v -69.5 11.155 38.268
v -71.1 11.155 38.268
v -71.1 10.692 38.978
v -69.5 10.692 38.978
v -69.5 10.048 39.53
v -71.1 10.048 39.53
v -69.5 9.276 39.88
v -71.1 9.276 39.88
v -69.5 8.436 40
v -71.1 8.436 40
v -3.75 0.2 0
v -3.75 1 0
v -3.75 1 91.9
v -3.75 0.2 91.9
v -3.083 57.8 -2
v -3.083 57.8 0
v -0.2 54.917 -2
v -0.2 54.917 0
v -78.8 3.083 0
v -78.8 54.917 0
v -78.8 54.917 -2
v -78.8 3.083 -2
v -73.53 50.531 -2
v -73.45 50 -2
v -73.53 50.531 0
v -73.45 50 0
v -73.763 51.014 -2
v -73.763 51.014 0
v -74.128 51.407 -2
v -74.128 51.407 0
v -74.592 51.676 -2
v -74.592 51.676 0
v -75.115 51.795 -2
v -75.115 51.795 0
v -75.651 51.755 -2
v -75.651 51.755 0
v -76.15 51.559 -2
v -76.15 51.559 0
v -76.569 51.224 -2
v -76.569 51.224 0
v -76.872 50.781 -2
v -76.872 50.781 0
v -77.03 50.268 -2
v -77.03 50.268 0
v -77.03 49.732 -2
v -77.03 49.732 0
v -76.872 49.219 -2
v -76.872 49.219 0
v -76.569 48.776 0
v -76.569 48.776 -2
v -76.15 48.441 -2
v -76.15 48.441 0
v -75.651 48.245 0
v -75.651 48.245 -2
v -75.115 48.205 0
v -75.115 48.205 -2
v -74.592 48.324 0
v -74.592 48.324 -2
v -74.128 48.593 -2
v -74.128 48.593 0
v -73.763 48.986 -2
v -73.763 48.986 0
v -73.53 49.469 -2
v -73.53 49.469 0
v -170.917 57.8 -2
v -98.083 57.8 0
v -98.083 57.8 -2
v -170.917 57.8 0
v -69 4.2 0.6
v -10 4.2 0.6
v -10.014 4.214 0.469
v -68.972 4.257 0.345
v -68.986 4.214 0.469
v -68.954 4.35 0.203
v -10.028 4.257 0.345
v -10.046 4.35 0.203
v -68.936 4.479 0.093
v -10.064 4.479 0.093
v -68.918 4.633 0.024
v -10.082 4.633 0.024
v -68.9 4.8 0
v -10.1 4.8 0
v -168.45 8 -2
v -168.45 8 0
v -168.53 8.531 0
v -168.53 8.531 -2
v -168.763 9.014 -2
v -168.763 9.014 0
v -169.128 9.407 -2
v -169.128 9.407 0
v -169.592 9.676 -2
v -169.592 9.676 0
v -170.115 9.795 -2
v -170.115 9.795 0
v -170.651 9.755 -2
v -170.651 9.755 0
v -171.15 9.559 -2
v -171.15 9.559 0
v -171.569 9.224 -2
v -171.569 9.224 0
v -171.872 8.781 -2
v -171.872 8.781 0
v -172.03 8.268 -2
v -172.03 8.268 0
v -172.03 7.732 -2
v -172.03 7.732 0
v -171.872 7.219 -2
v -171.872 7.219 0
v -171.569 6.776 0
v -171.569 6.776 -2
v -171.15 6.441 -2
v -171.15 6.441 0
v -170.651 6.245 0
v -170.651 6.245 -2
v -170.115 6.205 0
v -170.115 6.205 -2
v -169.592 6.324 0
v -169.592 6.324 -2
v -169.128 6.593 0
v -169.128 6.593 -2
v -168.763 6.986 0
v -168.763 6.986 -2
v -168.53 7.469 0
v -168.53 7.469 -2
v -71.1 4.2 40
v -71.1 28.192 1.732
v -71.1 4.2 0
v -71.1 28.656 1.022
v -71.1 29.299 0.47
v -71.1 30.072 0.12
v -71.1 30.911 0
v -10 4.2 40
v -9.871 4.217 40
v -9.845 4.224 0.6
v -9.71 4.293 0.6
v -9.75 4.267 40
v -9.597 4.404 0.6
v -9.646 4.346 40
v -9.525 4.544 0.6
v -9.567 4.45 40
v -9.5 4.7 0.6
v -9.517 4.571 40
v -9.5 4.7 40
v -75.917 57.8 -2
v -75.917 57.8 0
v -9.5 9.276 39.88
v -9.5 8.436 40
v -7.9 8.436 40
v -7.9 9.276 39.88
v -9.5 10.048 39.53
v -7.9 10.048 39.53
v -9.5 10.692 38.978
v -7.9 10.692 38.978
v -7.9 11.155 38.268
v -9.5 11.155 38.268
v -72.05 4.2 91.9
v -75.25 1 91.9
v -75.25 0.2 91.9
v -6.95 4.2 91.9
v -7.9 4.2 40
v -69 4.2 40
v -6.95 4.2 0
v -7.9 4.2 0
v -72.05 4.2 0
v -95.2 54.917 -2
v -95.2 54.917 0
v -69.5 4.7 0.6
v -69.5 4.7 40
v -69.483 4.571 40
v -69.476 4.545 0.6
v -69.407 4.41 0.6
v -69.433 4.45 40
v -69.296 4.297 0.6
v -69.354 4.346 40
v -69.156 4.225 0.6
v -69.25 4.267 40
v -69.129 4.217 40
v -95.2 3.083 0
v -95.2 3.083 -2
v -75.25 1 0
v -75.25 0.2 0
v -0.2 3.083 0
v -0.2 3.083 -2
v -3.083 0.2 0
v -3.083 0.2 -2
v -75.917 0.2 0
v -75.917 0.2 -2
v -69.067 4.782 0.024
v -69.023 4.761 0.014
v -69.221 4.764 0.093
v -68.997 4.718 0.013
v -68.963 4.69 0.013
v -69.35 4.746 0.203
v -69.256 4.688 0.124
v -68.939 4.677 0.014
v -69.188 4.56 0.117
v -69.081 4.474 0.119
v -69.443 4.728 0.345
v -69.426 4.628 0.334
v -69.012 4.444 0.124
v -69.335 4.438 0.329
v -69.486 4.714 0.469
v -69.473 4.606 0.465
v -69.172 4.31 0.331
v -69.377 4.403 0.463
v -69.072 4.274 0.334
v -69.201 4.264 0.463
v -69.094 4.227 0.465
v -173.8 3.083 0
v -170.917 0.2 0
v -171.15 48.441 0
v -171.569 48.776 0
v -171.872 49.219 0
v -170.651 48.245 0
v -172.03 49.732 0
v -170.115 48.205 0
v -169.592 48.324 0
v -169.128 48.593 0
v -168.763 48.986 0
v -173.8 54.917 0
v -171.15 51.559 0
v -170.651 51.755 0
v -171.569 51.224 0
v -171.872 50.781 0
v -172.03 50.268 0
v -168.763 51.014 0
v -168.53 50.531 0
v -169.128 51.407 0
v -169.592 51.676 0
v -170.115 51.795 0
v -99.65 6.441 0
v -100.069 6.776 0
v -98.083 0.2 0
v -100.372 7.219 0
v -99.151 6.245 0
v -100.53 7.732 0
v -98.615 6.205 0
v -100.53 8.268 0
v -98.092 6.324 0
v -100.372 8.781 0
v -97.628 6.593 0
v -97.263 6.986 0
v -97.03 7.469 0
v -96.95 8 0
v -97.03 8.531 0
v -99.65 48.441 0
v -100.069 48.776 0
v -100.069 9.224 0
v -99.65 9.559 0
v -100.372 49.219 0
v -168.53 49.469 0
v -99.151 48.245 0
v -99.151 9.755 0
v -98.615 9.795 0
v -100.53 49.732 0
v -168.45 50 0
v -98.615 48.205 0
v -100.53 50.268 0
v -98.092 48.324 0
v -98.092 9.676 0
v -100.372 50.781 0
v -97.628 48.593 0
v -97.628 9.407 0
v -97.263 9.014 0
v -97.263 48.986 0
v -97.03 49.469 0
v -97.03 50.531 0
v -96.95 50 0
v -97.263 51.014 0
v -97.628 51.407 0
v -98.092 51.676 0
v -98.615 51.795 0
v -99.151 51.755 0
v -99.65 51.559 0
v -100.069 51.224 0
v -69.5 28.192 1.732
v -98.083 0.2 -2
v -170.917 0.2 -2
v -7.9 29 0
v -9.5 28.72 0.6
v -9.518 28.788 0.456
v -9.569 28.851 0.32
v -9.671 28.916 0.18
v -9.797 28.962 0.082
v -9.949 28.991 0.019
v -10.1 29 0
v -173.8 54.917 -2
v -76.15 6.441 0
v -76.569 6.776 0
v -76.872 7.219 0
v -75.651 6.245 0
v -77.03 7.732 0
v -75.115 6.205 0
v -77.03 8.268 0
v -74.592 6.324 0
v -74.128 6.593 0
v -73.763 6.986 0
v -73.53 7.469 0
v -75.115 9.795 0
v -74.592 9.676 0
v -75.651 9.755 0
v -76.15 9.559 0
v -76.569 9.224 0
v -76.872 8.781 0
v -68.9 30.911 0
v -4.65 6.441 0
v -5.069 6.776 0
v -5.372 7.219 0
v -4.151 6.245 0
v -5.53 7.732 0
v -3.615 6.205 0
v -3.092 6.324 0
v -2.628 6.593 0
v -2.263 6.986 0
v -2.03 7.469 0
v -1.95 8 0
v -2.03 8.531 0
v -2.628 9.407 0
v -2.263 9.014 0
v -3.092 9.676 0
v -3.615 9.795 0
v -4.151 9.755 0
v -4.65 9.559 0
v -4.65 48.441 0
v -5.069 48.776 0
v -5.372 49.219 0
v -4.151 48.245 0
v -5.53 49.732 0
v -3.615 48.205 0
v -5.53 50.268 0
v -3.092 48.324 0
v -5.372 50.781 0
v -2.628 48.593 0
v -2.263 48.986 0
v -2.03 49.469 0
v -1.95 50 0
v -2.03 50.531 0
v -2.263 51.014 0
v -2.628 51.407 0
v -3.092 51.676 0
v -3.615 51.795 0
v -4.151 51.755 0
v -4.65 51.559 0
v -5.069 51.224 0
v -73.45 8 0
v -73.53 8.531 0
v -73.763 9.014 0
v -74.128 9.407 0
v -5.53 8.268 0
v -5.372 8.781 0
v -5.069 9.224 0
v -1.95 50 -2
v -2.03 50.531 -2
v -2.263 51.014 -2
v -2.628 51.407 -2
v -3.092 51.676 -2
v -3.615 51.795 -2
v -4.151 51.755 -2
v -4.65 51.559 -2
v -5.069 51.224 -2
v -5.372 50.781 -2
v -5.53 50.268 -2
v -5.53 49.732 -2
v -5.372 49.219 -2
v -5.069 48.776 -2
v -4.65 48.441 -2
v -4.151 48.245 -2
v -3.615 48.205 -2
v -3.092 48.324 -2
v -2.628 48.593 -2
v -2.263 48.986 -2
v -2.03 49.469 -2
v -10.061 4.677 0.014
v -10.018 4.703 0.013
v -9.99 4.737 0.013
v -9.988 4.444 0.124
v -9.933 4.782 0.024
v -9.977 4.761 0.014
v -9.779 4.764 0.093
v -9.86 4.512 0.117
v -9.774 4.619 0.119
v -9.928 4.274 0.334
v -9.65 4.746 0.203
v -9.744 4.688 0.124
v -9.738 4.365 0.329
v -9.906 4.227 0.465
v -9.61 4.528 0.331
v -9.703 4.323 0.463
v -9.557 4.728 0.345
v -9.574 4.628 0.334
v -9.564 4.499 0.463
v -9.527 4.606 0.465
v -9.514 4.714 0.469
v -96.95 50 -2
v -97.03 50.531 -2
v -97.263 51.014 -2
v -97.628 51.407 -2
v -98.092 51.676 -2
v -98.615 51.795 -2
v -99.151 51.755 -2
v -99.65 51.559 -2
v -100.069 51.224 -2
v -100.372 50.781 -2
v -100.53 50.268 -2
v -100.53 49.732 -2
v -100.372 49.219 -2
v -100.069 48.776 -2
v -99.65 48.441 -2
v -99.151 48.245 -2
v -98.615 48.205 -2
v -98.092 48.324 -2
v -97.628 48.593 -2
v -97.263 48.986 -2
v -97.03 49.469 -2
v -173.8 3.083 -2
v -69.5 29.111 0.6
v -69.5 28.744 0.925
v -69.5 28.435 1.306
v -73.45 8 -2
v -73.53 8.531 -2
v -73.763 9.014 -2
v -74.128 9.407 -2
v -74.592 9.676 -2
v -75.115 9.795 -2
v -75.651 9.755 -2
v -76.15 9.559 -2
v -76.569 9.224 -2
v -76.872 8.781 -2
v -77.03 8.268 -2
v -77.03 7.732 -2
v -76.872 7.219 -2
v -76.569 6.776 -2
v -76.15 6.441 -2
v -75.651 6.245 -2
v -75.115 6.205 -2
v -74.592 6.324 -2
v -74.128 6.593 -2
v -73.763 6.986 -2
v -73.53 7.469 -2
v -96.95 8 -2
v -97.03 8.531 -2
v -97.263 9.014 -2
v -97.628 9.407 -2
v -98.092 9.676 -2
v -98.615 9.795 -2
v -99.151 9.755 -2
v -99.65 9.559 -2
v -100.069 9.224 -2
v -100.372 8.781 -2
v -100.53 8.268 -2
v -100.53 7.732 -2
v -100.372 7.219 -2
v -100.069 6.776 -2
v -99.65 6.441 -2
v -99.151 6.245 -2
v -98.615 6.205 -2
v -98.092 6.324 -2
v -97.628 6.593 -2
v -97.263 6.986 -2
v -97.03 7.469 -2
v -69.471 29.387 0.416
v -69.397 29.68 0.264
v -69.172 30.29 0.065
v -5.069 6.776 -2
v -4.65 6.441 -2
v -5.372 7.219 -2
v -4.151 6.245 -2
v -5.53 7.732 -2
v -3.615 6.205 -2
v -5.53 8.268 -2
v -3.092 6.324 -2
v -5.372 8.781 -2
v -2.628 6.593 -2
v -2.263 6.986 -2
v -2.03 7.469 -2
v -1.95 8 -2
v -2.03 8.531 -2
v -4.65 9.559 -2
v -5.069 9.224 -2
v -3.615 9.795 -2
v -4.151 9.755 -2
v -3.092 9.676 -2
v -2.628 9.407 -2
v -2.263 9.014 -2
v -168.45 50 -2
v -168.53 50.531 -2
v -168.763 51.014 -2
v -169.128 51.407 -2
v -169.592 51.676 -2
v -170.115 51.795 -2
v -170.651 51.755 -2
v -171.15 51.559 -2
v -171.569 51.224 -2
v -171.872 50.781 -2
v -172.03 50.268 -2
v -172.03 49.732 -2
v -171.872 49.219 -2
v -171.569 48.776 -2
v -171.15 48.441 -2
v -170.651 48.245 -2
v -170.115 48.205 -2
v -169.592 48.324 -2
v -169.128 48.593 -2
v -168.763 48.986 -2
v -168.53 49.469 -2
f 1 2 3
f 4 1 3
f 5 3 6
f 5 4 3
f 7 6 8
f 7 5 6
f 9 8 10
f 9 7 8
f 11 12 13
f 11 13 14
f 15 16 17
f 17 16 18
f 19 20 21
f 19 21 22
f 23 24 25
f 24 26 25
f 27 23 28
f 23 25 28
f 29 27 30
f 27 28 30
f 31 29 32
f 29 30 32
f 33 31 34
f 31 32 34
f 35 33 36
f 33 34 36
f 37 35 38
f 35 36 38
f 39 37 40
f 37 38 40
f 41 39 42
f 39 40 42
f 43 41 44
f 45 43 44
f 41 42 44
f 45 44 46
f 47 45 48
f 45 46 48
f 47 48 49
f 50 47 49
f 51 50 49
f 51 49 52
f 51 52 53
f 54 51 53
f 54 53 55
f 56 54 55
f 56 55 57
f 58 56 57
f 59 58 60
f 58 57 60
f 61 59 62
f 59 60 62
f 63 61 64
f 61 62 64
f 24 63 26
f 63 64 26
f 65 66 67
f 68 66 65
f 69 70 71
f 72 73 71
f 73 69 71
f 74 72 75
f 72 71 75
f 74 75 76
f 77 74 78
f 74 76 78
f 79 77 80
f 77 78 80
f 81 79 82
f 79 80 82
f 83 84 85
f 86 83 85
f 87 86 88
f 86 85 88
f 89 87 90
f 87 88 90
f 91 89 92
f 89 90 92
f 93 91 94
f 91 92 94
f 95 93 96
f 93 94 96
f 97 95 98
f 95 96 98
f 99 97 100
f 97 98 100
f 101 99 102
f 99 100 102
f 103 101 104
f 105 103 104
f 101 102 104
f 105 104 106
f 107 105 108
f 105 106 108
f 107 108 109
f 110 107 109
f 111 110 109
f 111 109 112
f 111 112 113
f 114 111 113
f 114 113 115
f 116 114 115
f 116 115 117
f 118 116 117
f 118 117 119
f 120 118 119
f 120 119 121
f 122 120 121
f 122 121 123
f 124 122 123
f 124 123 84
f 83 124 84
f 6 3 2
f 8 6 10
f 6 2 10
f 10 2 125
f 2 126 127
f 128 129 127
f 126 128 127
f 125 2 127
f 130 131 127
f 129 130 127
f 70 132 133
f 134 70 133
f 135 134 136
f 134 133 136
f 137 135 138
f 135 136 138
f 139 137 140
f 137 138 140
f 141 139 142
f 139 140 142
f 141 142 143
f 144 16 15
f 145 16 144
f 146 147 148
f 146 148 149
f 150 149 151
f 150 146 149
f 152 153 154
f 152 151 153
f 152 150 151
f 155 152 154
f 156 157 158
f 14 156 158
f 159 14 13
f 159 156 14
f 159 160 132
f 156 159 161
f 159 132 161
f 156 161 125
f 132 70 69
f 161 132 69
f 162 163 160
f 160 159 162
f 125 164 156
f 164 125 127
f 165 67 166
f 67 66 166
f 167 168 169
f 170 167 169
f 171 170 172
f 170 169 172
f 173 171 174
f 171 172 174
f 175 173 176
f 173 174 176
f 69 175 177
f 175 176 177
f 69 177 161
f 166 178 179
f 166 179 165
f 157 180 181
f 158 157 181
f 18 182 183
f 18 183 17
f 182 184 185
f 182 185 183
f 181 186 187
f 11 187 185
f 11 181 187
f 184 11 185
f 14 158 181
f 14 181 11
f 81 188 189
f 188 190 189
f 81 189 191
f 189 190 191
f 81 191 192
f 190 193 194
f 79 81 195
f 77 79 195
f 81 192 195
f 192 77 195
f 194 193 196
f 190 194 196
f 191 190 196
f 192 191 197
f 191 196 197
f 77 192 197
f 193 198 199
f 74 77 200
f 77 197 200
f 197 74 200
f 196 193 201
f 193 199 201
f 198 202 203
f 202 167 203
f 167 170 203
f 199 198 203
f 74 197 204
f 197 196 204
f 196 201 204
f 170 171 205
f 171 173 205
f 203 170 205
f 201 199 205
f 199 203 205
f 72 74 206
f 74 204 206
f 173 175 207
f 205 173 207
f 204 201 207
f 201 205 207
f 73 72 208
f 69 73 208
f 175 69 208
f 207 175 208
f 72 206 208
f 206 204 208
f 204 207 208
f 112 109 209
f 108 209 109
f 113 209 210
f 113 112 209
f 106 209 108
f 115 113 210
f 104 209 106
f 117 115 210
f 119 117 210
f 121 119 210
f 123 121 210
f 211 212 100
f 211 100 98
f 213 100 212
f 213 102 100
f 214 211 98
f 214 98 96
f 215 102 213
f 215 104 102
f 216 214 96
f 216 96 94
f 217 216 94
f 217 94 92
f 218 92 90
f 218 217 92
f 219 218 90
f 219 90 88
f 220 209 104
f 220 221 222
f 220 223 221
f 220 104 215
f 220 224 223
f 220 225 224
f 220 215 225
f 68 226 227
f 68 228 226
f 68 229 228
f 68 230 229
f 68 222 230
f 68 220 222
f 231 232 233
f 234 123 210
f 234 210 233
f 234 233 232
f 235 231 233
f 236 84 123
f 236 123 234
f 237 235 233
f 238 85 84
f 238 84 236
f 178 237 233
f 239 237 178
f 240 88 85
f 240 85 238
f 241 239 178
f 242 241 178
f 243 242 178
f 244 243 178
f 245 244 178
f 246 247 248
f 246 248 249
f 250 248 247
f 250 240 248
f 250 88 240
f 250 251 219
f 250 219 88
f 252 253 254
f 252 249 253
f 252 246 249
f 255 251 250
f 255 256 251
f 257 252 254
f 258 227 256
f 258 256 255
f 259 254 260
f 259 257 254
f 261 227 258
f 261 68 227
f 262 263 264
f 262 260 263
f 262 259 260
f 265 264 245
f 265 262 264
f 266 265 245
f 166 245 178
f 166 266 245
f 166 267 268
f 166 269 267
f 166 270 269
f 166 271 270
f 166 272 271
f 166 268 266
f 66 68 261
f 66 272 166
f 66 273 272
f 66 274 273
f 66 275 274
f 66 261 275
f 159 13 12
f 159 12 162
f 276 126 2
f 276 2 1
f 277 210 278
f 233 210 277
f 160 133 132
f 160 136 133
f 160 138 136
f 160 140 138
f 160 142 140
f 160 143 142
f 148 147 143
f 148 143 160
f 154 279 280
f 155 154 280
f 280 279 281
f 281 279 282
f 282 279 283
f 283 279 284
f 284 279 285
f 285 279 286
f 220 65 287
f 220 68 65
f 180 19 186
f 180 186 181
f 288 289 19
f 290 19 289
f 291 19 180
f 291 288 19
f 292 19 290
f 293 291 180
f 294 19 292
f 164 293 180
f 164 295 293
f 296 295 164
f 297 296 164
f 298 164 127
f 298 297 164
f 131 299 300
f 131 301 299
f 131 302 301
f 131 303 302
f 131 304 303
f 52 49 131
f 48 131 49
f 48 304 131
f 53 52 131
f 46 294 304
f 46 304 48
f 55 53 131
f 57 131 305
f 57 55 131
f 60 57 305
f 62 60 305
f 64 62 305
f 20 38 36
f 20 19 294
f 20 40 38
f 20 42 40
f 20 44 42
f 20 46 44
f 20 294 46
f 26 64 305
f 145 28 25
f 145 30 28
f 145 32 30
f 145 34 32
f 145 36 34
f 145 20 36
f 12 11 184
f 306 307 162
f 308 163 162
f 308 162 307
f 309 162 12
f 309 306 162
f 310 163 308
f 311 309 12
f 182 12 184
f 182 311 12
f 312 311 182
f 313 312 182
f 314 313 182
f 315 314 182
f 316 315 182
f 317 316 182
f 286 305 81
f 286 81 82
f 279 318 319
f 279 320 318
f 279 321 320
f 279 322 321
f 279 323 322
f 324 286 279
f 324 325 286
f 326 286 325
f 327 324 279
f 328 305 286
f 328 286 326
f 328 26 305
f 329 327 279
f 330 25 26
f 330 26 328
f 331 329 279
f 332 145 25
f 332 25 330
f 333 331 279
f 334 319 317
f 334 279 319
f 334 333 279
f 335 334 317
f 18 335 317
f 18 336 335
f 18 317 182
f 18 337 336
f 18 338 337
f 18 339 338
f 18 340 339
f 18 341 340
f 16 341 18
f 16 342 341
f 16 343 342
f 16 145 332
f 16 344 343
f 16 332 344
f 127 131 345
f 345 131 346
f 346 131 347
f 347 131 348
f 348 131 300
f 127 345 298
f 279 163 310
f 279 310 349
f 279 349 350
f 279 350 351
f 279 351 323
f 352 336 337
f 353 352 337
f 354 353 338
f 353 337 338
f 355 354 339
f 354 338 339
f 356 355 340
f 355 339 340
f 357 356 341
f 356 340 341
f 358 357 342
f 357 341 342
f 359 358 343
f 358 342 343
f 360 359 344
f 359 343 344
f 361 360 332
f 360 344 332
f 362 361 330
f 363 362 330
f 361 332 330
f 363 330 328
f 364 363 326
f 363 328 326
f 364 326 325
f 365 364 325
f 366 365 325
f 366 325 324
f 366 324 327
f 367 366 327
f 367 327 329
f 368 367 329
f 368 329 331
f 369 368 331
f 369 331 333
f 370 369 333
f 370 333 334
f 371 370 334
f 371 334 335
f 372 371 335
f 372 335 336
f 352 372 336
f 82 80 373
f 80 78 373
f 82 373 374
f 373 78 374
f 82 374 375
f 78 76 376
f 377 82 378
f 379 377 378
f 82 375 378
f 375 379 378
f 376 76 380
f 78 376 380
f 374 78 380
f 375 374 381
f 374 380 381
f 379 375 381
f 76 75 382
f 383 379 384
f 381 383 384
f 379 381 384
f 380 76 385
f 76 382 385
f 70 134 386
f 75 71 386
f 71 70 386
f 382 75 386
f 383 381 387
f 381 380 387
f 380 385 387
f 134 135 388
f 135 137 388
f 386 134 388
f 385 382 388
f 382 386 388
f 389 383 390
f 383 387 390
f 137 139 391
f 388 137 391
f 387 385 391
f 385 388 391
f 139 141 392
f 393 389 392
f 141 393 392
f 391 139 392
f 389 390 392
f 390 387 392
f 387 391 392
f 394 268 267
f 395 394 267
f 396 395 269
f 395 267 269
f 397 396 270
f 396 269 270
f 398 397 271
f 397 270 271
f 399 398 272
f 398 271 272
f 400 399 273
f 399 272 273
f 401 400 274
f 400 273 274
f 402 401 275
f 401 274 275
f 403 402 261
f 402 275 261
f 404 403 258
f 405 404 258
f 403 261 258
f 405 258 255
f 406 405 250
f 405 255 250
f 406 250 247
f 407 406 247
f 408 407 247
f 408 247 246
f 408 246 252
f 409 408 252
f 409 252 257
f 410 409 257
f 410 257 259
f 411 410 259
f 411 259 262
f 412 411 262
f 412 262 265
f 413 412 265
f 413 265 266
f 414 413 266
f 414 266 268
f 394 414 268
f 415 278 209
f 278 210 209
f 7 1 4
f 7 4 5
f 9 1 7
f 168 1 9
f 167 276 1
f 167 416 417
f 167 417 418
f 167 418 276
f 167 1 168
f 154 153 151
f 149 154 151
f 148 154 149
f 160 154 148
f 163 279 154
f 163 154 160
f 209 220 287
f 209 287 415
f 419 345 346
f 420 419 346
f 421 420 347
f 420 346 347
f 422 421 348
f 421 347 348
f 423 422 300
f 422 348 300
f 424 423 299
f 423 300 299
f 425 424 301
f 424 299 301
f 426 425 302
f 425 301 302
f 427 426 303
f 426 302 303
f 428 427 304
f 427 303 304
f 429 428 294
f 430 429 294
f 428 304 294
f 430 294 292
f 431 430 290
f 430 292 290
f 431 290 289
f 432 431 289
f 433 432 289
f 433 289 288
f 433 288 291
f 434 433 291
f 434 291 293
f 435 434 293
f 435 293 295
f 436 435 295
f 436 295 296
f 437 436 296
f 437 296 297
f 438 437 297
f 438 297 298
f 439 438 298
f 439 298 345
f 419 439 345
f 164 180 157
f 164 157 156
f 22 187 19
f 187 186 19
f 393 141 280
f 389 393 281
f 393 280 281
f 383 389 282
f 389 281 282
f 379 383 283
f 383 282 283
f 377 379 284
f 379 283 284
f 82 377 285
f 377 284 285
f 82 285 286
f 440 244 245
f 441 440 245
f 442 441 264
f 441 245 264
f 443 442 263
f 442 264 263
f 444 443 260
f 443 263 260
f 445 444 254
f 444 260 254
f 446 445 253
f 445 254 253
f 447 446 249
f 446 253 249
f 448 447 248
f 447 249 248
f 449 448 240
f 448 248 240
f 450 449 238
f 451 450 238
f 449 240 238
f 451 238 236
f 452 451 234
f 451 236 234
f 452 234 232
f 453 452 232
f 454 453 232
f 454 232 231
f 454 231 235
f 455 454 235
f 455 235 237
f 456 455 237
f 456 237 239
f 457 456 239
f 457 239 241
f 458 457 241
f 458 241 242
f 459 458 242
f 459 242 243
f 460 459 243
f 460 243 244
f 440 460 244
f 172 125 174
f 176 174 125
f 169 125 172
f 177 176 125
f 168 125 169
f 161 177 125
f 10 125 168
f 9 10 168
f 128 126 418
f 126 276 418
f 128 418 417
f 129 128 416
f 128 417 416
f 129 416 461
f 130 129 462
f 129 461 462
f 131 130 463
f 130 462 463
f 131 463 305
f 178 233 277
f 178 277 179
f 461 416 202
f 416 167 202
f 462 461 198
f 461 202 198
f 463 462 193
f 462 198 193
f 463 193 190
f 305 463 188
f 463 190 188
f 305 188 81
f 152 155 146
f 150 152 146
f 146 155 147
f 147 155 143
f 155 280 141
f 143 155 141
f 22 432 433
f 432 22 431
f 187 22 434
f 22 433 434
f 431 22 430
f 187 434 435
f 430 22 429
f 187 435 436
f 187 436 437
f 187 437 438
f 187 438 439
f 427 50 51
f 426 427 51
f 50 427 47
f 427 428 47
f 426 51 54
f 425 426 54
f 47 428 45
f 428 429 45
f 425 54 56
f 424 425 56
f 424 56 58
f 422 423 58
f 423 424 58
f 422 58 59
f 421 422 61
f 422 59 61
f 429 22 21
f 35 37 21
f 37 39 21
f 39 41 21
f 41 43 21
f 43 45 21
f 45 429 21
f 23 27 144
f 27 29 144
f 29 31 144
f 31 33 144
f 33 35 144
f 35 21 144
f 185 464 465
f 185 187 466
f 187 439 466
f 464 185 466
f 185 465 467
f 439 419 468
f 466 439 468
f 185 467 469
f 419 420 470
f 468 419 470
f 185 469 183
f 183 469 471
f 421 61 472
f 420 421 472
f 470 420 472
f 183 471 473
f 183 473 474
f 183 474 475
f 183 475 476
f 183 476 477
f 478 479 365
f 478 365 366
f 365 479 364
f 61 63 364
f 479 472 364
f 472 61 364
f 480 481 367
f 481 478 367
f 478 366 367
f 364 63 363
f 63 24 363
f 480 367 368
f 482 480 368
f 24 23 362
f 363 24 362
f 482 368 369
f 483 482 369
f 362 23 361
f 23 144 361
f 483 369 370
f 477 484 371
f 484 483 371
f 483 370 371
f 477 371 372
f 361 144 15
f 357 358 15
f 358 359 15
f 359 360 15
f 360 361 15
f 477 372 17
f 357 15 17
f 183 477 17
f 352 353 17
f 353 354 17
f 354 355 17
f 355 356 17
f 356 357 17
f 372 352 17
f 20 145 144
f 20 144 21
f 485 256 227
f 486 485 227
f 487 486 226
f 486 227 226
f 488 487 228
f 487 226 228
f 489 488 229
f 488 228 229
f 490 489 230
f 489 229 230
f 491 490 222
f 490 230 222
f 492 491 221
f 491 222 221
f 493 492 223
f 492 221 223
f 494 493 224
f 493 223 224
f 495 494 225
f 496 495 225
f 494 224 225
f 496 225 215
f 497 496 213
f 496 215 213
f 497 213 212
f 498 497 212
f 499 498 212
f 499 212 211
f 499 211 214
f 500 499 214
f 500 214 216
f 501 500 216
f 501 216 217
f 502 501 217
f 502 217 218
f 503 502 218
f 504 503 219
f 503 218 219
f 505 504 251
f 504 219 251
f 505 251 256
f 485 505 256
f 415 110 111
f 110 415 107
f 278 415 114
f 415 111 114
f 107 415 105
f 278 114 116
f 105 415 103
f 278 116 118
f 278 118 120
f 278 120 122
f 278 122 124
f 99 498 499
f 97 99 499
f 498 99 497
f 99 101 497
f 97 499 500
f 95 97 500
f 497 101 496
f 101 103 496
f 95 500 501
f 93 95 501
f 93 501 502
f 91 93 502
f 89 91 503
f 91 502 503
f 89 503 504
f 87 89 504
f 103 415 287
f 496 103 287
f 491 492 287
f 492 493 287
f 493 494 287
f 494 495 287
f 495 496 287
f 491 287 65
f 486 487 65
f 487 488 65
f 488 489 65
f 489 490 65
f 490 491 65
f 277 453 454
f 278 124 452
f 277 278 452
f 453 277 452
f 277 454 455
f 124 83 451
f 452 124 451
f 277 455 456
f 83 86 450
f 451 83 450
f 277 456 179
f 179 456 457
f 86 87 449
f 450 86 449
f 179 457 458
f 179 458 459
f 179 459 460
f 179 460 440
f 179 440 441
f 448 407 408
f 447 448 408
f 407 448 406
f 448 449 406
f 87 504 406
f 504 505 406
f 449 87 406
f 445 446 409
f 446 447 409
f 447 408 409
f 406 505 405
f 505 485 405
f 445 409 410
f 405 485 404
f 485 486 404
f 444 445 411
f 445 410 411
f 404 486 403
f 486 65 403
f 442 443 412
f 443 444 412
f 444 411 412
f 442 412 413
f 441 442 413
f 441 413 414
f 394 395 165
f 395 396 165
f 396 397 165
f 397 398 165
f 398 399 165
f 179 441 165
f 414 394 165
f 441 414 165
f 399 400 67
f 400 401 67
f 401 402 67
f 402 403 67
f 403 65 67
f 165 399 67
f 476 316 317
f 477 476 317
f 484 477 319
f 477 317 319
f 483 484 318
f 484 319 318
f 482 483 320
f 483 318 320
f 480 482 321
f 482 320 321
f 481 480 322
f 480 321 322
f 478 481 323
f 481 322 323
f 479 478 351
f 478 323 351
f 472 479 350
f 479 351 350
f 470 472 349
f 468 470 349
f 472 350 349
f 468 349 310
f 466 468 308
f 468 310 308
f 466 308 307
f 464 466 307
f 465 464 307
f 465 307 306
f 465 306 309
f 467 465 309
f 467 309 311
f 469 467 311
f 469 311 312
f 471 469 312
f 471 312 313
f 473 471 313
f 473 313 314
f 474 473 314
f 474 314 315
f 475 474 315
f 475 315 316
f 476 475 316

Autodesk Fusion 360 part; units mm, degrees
sketch "Sketch1" plane through (0, 0, 0) normal (0, 0, 1) x (1, 0, 0)
  circle A0 centre (-75.25, 8) radius 1.4
  circle A1 centre (-75.25, 8) radius 2.5
  line L0 (-3.75, 1) -> (-3.75, 8) construction
  line L1 (-7.5, 29) -> (0, 29) construction
  line L2 (-7.5, 0) -> (-71.5, 0)
  line L3 (-75.25, 1) -> (-71.5, 4.75)
  line L4 (-7.5, 0) -> (-7.5, 58)
  circle A2 centre (-75.25, 50) radius 2.5
  line L5 (-79, 55) -> (-79, 3)
  line L6 (-7.5, 0) -> (-3, 0)
  line L7 (-7.5, 58) -> (-3, 58)
  line L8 (-3.75, 0) -> (-3.75, 1)
  circle A3 centre (-3.75, 50) radius 1.4
  line L9 (-3, 58) -> (0, 55)
  line L10 (-76, 58) -> (-79, 55)
  line L11 (-75.25, 0) -> (-75.25, 1)
  circle A4 centre (-3.75, 8) radius 1.4
  line L12 (-7.5, 0) -> (-7.5, 58)
  line L13 (-7.5, 58) -> (-76, 58)
  circle A5 centre (-3.75, 8) radius 2.5
  line L14 (-71.5, 58) -> (-71.5, 0)
  line L15 (-3.75, 1) -> (-7.5, 4.75)
  line L16 (-76, 0) -> (-71.5, 0)
  line L17 (0, 3) -> (0, 55)
  line L18 (-76, 0) -> (-79, 3)
  line L19 (-39.5, 0) -> (-39.5, 27) construction
  circle A6 centre (-3.75, 50) radius 2.5
  circle A7 centre (-75.25, 50) radius 1.4
  line L20 (-3, 0) -> (0, 3)
  point P0 (-79, 0)
  point P1 (7.1, -7)
  point P2 (0, 58)
  dimension "d1" = 7.5
  dimension "d2" = 3
  dimension "d3" = 3
  dimension "d4" = 135
  dimension "d5" = 1
  dimension "d6" = 5
  dimension "d7" = 2.8
  dimension "d8" = 3
  dimension "d9" = 3
  dimension "d10" = 3
  dimension "d11" = 3
  dimension "d12" = 8
  dimension "d13" = 7.5
  dimension "d14" = 64
  dimension "d15" = 3.75
  dimension "d16" = 3
  dimension "d17" = 3
sketch "Sketch2" plane through (0, 0, 0) normal (0, 0, 1) x (1, 0, 0)
  line L0 (-7.5, 58) -> (-76, 58) construction
  line L1 (-76, 58) -> (-79, 55)
  line L2 (-79, 55) -> (-79, 3)
  line L3 (-76, 0) -> (-79, 3)
  line L4 (-76, 0) -> (-71.5, 0)
  line L5 (-7.5, 0) -> (-3, 0)
  line L6 (-3, 0) -> (0, 3)
  line L7 (-3, 58) -> (0, 55)
  line L8 (-7.5, 58) -> (-3, 58) construction
  line L9 (0, 3) -> (0, 55)
  line L10 (-7.5, 0) -> (-71.5, 0)
  line L11 (-7.5, 57.8) -> (-75.9172, 57.8)
  line L12 (-75.9172, 57.8) -> (-78.8, 54.9172)
  line L13 (-78.8, 54.9172) -> (-78.8, 3.0828)
  line L14 (-75.9172, 0.2) -> (-78.8, 3.0828)
  line L15 (-75.9172, 0.2) -> (-71.5, 0.2)
  line L16 (-7.5, 0.2) -> (-71.5, 0.2)
  line L17 (-7.5, 0.2) -> (-3.0828, 0.2)
  line L18 (-3.0828, 0.2) -> (-0.2, 3.0828)
  line L19 (-0.2, 3.0828) -> (-0.2, 54.9172)
  line L20 (-3.0828, 57.8) -> (-0.2, 54.9172)
  line L21 (-7.5, 57.8) -> (-3.0828, 57.8)
  dimension "d19" = -0.2
sketch "Sketch3" plane through (0, 0, 0) normal (0, 0, 1) x (1, 0, 0)
  line L0 (-71.5, 58) -> (-71.5, 0) construction
  line L1 (-7.5, 0) -> (-7.5, 58) construction
  line L2 (-78.8, 54.9172) -> (-78.8, 3.0828)
  line L3 (-75.9172, 0.2) -> (-78.8, 3.0828)
  line L4 (-75.9172, 0.2) -> (-71.5, 0.2)
  line L5 (-7.5, 0.2) -> (-71.5, 0.2)
  line L6 (-7.5, 0.2) -> (-3.0828, 0.2)
  line L7 (-3.0828, 0.2) -> (-0.2, 3.0828)
  line L8 (-0.2, 3.0828) -> (-0.2, 54.9172)
  line L9 (-3.0828, 57.8) -> (-0.2, 54.9172)
  line L10 (-7.5, 57.8) -> (-3.0828, 57.8)
  line L11 (-7.5, 57.8) -> (-75.9172, 57.8)
  line L12 (-75.9172, 57.8) -> (-78.8, 54.9172)
  line L13 (-71.1, 58) -> (-71.1, 0)
  line L14 (-39.5, 0.2) -> (-39.5, 13) construction
  line L15 (-7.9, 58) -> (-7.9, 0)
  circle A0 centre (-75.25, 50) radius 1.4 construction
  circle A1 centre (-75.25, 8) radius 1.4 construction
  circle A2 centre (-75.25, 50) radius 1.8
  circle A3 centre (-75.25, 8) radius 1.8
  circle A4 centre (-3.75, 8) radius 1.8
  circle A5 centre (-3.75, 50) radius 1.8
  line L16 (-69.5, 58) -> (-69.5, 0)
  line L17 (-9.5, 58) -> (-9.5, 0)
  line L18 (-9.5, 4.2) -> (-69.5, 4.2)
  line L19 (-75.25, 0) -> (-75.25, 1) construction
  line L20 (-75.25, 1) -> (-71.5, 4.75) construction
  line L21 (-75.25, 1) -> (-71.1, 5.15)
  line L22 (-75.25, 1) -> (-75.25, 0.2)
  line L23 (-3.75, 1) -> (-3.75, 0.2)
  line L24 (-3.75, 1) -> (-7.9, 5.15)
  line L25 (-69.5, 4.2) -> (-72.05, 4.2)
  line L26 (-9.5, 4.2) -> (-6.95, 4.2)
  line L27 (-7.9, 29) -> (-9.5, 29)
  line L28 (-71.1, 29) -> (-69.5, 29)
  dimension "d20" = -0.4
  dimension "d21" = 3.6
  dimension "d22" = 3.6
  dimension "d23" = -2
  dimension "d31" = 4
extrude "Extrude1" add sketch "Sketch3" against normal blind 2 makes body 1 in component "Panel Template"
extrude "Extrude1'" add sketch "Sketch3" against normal blind 2 separate body makes body 2 in component "Tray Template"
extrude "Extrude2" add sketch "Sketch3" along normal blind 91.9 contours L4 L5 L13 L21 L22 L25 | L5 L13 L16 L25 | L5 L16 L17 L18 | L5 L15 L17 L26 | L5 L6 L15 L23 L24 L26 bodies 2 in component "Tray Template"
extrude "Extrude3" add sketch "Sketch3" along normal blind 40 contours L13 L16 L25 L28 | L15 L17 L26 L27 bodies 2 in component "Tray Template"
draft "Draft1" angle 25 neutral plane through (0, 0, 0) pull (0, 0, 1) 2 faces at (-8.4333, 29, 13.3333) (-70.5667, 29, 13.3333) on bodies 2 in component "Tray Template"
fillet "Fillet1" radius 3 3 edges at (-8.7, 10.3477, 40) (-70.3, 10.3477, 40) (-70.3, 29, 0) on bodies 2 in component "Tray Template"
fillet "Fillet2" radius 0.5 2 edges at (-9.5, 4.2, 20) (-69.5, 4.2, 20) on bodies 2 in component "Tray Template"
fillet "Fillet3" radius 0.6 5 edges at (-69.5, 17.8056, 0) (-69.3536, 4.3464, 0) (-39.5, 4.2, 0) (-9.6464, 4.3464, 0) (-9.5, 16.85, 0) on bodies 2 in component "Tray Template"
component "Panel Template" placed x (1, 0, 0) y (0, 1, 0) z (0, 0, 1) at (-95, 0, 0)
component "Tray Template" placed x (1, 0, 0) y (0, 1, 0) z (0, 0, 1) at (0, 0, 0)
equation "d22 = d21"
